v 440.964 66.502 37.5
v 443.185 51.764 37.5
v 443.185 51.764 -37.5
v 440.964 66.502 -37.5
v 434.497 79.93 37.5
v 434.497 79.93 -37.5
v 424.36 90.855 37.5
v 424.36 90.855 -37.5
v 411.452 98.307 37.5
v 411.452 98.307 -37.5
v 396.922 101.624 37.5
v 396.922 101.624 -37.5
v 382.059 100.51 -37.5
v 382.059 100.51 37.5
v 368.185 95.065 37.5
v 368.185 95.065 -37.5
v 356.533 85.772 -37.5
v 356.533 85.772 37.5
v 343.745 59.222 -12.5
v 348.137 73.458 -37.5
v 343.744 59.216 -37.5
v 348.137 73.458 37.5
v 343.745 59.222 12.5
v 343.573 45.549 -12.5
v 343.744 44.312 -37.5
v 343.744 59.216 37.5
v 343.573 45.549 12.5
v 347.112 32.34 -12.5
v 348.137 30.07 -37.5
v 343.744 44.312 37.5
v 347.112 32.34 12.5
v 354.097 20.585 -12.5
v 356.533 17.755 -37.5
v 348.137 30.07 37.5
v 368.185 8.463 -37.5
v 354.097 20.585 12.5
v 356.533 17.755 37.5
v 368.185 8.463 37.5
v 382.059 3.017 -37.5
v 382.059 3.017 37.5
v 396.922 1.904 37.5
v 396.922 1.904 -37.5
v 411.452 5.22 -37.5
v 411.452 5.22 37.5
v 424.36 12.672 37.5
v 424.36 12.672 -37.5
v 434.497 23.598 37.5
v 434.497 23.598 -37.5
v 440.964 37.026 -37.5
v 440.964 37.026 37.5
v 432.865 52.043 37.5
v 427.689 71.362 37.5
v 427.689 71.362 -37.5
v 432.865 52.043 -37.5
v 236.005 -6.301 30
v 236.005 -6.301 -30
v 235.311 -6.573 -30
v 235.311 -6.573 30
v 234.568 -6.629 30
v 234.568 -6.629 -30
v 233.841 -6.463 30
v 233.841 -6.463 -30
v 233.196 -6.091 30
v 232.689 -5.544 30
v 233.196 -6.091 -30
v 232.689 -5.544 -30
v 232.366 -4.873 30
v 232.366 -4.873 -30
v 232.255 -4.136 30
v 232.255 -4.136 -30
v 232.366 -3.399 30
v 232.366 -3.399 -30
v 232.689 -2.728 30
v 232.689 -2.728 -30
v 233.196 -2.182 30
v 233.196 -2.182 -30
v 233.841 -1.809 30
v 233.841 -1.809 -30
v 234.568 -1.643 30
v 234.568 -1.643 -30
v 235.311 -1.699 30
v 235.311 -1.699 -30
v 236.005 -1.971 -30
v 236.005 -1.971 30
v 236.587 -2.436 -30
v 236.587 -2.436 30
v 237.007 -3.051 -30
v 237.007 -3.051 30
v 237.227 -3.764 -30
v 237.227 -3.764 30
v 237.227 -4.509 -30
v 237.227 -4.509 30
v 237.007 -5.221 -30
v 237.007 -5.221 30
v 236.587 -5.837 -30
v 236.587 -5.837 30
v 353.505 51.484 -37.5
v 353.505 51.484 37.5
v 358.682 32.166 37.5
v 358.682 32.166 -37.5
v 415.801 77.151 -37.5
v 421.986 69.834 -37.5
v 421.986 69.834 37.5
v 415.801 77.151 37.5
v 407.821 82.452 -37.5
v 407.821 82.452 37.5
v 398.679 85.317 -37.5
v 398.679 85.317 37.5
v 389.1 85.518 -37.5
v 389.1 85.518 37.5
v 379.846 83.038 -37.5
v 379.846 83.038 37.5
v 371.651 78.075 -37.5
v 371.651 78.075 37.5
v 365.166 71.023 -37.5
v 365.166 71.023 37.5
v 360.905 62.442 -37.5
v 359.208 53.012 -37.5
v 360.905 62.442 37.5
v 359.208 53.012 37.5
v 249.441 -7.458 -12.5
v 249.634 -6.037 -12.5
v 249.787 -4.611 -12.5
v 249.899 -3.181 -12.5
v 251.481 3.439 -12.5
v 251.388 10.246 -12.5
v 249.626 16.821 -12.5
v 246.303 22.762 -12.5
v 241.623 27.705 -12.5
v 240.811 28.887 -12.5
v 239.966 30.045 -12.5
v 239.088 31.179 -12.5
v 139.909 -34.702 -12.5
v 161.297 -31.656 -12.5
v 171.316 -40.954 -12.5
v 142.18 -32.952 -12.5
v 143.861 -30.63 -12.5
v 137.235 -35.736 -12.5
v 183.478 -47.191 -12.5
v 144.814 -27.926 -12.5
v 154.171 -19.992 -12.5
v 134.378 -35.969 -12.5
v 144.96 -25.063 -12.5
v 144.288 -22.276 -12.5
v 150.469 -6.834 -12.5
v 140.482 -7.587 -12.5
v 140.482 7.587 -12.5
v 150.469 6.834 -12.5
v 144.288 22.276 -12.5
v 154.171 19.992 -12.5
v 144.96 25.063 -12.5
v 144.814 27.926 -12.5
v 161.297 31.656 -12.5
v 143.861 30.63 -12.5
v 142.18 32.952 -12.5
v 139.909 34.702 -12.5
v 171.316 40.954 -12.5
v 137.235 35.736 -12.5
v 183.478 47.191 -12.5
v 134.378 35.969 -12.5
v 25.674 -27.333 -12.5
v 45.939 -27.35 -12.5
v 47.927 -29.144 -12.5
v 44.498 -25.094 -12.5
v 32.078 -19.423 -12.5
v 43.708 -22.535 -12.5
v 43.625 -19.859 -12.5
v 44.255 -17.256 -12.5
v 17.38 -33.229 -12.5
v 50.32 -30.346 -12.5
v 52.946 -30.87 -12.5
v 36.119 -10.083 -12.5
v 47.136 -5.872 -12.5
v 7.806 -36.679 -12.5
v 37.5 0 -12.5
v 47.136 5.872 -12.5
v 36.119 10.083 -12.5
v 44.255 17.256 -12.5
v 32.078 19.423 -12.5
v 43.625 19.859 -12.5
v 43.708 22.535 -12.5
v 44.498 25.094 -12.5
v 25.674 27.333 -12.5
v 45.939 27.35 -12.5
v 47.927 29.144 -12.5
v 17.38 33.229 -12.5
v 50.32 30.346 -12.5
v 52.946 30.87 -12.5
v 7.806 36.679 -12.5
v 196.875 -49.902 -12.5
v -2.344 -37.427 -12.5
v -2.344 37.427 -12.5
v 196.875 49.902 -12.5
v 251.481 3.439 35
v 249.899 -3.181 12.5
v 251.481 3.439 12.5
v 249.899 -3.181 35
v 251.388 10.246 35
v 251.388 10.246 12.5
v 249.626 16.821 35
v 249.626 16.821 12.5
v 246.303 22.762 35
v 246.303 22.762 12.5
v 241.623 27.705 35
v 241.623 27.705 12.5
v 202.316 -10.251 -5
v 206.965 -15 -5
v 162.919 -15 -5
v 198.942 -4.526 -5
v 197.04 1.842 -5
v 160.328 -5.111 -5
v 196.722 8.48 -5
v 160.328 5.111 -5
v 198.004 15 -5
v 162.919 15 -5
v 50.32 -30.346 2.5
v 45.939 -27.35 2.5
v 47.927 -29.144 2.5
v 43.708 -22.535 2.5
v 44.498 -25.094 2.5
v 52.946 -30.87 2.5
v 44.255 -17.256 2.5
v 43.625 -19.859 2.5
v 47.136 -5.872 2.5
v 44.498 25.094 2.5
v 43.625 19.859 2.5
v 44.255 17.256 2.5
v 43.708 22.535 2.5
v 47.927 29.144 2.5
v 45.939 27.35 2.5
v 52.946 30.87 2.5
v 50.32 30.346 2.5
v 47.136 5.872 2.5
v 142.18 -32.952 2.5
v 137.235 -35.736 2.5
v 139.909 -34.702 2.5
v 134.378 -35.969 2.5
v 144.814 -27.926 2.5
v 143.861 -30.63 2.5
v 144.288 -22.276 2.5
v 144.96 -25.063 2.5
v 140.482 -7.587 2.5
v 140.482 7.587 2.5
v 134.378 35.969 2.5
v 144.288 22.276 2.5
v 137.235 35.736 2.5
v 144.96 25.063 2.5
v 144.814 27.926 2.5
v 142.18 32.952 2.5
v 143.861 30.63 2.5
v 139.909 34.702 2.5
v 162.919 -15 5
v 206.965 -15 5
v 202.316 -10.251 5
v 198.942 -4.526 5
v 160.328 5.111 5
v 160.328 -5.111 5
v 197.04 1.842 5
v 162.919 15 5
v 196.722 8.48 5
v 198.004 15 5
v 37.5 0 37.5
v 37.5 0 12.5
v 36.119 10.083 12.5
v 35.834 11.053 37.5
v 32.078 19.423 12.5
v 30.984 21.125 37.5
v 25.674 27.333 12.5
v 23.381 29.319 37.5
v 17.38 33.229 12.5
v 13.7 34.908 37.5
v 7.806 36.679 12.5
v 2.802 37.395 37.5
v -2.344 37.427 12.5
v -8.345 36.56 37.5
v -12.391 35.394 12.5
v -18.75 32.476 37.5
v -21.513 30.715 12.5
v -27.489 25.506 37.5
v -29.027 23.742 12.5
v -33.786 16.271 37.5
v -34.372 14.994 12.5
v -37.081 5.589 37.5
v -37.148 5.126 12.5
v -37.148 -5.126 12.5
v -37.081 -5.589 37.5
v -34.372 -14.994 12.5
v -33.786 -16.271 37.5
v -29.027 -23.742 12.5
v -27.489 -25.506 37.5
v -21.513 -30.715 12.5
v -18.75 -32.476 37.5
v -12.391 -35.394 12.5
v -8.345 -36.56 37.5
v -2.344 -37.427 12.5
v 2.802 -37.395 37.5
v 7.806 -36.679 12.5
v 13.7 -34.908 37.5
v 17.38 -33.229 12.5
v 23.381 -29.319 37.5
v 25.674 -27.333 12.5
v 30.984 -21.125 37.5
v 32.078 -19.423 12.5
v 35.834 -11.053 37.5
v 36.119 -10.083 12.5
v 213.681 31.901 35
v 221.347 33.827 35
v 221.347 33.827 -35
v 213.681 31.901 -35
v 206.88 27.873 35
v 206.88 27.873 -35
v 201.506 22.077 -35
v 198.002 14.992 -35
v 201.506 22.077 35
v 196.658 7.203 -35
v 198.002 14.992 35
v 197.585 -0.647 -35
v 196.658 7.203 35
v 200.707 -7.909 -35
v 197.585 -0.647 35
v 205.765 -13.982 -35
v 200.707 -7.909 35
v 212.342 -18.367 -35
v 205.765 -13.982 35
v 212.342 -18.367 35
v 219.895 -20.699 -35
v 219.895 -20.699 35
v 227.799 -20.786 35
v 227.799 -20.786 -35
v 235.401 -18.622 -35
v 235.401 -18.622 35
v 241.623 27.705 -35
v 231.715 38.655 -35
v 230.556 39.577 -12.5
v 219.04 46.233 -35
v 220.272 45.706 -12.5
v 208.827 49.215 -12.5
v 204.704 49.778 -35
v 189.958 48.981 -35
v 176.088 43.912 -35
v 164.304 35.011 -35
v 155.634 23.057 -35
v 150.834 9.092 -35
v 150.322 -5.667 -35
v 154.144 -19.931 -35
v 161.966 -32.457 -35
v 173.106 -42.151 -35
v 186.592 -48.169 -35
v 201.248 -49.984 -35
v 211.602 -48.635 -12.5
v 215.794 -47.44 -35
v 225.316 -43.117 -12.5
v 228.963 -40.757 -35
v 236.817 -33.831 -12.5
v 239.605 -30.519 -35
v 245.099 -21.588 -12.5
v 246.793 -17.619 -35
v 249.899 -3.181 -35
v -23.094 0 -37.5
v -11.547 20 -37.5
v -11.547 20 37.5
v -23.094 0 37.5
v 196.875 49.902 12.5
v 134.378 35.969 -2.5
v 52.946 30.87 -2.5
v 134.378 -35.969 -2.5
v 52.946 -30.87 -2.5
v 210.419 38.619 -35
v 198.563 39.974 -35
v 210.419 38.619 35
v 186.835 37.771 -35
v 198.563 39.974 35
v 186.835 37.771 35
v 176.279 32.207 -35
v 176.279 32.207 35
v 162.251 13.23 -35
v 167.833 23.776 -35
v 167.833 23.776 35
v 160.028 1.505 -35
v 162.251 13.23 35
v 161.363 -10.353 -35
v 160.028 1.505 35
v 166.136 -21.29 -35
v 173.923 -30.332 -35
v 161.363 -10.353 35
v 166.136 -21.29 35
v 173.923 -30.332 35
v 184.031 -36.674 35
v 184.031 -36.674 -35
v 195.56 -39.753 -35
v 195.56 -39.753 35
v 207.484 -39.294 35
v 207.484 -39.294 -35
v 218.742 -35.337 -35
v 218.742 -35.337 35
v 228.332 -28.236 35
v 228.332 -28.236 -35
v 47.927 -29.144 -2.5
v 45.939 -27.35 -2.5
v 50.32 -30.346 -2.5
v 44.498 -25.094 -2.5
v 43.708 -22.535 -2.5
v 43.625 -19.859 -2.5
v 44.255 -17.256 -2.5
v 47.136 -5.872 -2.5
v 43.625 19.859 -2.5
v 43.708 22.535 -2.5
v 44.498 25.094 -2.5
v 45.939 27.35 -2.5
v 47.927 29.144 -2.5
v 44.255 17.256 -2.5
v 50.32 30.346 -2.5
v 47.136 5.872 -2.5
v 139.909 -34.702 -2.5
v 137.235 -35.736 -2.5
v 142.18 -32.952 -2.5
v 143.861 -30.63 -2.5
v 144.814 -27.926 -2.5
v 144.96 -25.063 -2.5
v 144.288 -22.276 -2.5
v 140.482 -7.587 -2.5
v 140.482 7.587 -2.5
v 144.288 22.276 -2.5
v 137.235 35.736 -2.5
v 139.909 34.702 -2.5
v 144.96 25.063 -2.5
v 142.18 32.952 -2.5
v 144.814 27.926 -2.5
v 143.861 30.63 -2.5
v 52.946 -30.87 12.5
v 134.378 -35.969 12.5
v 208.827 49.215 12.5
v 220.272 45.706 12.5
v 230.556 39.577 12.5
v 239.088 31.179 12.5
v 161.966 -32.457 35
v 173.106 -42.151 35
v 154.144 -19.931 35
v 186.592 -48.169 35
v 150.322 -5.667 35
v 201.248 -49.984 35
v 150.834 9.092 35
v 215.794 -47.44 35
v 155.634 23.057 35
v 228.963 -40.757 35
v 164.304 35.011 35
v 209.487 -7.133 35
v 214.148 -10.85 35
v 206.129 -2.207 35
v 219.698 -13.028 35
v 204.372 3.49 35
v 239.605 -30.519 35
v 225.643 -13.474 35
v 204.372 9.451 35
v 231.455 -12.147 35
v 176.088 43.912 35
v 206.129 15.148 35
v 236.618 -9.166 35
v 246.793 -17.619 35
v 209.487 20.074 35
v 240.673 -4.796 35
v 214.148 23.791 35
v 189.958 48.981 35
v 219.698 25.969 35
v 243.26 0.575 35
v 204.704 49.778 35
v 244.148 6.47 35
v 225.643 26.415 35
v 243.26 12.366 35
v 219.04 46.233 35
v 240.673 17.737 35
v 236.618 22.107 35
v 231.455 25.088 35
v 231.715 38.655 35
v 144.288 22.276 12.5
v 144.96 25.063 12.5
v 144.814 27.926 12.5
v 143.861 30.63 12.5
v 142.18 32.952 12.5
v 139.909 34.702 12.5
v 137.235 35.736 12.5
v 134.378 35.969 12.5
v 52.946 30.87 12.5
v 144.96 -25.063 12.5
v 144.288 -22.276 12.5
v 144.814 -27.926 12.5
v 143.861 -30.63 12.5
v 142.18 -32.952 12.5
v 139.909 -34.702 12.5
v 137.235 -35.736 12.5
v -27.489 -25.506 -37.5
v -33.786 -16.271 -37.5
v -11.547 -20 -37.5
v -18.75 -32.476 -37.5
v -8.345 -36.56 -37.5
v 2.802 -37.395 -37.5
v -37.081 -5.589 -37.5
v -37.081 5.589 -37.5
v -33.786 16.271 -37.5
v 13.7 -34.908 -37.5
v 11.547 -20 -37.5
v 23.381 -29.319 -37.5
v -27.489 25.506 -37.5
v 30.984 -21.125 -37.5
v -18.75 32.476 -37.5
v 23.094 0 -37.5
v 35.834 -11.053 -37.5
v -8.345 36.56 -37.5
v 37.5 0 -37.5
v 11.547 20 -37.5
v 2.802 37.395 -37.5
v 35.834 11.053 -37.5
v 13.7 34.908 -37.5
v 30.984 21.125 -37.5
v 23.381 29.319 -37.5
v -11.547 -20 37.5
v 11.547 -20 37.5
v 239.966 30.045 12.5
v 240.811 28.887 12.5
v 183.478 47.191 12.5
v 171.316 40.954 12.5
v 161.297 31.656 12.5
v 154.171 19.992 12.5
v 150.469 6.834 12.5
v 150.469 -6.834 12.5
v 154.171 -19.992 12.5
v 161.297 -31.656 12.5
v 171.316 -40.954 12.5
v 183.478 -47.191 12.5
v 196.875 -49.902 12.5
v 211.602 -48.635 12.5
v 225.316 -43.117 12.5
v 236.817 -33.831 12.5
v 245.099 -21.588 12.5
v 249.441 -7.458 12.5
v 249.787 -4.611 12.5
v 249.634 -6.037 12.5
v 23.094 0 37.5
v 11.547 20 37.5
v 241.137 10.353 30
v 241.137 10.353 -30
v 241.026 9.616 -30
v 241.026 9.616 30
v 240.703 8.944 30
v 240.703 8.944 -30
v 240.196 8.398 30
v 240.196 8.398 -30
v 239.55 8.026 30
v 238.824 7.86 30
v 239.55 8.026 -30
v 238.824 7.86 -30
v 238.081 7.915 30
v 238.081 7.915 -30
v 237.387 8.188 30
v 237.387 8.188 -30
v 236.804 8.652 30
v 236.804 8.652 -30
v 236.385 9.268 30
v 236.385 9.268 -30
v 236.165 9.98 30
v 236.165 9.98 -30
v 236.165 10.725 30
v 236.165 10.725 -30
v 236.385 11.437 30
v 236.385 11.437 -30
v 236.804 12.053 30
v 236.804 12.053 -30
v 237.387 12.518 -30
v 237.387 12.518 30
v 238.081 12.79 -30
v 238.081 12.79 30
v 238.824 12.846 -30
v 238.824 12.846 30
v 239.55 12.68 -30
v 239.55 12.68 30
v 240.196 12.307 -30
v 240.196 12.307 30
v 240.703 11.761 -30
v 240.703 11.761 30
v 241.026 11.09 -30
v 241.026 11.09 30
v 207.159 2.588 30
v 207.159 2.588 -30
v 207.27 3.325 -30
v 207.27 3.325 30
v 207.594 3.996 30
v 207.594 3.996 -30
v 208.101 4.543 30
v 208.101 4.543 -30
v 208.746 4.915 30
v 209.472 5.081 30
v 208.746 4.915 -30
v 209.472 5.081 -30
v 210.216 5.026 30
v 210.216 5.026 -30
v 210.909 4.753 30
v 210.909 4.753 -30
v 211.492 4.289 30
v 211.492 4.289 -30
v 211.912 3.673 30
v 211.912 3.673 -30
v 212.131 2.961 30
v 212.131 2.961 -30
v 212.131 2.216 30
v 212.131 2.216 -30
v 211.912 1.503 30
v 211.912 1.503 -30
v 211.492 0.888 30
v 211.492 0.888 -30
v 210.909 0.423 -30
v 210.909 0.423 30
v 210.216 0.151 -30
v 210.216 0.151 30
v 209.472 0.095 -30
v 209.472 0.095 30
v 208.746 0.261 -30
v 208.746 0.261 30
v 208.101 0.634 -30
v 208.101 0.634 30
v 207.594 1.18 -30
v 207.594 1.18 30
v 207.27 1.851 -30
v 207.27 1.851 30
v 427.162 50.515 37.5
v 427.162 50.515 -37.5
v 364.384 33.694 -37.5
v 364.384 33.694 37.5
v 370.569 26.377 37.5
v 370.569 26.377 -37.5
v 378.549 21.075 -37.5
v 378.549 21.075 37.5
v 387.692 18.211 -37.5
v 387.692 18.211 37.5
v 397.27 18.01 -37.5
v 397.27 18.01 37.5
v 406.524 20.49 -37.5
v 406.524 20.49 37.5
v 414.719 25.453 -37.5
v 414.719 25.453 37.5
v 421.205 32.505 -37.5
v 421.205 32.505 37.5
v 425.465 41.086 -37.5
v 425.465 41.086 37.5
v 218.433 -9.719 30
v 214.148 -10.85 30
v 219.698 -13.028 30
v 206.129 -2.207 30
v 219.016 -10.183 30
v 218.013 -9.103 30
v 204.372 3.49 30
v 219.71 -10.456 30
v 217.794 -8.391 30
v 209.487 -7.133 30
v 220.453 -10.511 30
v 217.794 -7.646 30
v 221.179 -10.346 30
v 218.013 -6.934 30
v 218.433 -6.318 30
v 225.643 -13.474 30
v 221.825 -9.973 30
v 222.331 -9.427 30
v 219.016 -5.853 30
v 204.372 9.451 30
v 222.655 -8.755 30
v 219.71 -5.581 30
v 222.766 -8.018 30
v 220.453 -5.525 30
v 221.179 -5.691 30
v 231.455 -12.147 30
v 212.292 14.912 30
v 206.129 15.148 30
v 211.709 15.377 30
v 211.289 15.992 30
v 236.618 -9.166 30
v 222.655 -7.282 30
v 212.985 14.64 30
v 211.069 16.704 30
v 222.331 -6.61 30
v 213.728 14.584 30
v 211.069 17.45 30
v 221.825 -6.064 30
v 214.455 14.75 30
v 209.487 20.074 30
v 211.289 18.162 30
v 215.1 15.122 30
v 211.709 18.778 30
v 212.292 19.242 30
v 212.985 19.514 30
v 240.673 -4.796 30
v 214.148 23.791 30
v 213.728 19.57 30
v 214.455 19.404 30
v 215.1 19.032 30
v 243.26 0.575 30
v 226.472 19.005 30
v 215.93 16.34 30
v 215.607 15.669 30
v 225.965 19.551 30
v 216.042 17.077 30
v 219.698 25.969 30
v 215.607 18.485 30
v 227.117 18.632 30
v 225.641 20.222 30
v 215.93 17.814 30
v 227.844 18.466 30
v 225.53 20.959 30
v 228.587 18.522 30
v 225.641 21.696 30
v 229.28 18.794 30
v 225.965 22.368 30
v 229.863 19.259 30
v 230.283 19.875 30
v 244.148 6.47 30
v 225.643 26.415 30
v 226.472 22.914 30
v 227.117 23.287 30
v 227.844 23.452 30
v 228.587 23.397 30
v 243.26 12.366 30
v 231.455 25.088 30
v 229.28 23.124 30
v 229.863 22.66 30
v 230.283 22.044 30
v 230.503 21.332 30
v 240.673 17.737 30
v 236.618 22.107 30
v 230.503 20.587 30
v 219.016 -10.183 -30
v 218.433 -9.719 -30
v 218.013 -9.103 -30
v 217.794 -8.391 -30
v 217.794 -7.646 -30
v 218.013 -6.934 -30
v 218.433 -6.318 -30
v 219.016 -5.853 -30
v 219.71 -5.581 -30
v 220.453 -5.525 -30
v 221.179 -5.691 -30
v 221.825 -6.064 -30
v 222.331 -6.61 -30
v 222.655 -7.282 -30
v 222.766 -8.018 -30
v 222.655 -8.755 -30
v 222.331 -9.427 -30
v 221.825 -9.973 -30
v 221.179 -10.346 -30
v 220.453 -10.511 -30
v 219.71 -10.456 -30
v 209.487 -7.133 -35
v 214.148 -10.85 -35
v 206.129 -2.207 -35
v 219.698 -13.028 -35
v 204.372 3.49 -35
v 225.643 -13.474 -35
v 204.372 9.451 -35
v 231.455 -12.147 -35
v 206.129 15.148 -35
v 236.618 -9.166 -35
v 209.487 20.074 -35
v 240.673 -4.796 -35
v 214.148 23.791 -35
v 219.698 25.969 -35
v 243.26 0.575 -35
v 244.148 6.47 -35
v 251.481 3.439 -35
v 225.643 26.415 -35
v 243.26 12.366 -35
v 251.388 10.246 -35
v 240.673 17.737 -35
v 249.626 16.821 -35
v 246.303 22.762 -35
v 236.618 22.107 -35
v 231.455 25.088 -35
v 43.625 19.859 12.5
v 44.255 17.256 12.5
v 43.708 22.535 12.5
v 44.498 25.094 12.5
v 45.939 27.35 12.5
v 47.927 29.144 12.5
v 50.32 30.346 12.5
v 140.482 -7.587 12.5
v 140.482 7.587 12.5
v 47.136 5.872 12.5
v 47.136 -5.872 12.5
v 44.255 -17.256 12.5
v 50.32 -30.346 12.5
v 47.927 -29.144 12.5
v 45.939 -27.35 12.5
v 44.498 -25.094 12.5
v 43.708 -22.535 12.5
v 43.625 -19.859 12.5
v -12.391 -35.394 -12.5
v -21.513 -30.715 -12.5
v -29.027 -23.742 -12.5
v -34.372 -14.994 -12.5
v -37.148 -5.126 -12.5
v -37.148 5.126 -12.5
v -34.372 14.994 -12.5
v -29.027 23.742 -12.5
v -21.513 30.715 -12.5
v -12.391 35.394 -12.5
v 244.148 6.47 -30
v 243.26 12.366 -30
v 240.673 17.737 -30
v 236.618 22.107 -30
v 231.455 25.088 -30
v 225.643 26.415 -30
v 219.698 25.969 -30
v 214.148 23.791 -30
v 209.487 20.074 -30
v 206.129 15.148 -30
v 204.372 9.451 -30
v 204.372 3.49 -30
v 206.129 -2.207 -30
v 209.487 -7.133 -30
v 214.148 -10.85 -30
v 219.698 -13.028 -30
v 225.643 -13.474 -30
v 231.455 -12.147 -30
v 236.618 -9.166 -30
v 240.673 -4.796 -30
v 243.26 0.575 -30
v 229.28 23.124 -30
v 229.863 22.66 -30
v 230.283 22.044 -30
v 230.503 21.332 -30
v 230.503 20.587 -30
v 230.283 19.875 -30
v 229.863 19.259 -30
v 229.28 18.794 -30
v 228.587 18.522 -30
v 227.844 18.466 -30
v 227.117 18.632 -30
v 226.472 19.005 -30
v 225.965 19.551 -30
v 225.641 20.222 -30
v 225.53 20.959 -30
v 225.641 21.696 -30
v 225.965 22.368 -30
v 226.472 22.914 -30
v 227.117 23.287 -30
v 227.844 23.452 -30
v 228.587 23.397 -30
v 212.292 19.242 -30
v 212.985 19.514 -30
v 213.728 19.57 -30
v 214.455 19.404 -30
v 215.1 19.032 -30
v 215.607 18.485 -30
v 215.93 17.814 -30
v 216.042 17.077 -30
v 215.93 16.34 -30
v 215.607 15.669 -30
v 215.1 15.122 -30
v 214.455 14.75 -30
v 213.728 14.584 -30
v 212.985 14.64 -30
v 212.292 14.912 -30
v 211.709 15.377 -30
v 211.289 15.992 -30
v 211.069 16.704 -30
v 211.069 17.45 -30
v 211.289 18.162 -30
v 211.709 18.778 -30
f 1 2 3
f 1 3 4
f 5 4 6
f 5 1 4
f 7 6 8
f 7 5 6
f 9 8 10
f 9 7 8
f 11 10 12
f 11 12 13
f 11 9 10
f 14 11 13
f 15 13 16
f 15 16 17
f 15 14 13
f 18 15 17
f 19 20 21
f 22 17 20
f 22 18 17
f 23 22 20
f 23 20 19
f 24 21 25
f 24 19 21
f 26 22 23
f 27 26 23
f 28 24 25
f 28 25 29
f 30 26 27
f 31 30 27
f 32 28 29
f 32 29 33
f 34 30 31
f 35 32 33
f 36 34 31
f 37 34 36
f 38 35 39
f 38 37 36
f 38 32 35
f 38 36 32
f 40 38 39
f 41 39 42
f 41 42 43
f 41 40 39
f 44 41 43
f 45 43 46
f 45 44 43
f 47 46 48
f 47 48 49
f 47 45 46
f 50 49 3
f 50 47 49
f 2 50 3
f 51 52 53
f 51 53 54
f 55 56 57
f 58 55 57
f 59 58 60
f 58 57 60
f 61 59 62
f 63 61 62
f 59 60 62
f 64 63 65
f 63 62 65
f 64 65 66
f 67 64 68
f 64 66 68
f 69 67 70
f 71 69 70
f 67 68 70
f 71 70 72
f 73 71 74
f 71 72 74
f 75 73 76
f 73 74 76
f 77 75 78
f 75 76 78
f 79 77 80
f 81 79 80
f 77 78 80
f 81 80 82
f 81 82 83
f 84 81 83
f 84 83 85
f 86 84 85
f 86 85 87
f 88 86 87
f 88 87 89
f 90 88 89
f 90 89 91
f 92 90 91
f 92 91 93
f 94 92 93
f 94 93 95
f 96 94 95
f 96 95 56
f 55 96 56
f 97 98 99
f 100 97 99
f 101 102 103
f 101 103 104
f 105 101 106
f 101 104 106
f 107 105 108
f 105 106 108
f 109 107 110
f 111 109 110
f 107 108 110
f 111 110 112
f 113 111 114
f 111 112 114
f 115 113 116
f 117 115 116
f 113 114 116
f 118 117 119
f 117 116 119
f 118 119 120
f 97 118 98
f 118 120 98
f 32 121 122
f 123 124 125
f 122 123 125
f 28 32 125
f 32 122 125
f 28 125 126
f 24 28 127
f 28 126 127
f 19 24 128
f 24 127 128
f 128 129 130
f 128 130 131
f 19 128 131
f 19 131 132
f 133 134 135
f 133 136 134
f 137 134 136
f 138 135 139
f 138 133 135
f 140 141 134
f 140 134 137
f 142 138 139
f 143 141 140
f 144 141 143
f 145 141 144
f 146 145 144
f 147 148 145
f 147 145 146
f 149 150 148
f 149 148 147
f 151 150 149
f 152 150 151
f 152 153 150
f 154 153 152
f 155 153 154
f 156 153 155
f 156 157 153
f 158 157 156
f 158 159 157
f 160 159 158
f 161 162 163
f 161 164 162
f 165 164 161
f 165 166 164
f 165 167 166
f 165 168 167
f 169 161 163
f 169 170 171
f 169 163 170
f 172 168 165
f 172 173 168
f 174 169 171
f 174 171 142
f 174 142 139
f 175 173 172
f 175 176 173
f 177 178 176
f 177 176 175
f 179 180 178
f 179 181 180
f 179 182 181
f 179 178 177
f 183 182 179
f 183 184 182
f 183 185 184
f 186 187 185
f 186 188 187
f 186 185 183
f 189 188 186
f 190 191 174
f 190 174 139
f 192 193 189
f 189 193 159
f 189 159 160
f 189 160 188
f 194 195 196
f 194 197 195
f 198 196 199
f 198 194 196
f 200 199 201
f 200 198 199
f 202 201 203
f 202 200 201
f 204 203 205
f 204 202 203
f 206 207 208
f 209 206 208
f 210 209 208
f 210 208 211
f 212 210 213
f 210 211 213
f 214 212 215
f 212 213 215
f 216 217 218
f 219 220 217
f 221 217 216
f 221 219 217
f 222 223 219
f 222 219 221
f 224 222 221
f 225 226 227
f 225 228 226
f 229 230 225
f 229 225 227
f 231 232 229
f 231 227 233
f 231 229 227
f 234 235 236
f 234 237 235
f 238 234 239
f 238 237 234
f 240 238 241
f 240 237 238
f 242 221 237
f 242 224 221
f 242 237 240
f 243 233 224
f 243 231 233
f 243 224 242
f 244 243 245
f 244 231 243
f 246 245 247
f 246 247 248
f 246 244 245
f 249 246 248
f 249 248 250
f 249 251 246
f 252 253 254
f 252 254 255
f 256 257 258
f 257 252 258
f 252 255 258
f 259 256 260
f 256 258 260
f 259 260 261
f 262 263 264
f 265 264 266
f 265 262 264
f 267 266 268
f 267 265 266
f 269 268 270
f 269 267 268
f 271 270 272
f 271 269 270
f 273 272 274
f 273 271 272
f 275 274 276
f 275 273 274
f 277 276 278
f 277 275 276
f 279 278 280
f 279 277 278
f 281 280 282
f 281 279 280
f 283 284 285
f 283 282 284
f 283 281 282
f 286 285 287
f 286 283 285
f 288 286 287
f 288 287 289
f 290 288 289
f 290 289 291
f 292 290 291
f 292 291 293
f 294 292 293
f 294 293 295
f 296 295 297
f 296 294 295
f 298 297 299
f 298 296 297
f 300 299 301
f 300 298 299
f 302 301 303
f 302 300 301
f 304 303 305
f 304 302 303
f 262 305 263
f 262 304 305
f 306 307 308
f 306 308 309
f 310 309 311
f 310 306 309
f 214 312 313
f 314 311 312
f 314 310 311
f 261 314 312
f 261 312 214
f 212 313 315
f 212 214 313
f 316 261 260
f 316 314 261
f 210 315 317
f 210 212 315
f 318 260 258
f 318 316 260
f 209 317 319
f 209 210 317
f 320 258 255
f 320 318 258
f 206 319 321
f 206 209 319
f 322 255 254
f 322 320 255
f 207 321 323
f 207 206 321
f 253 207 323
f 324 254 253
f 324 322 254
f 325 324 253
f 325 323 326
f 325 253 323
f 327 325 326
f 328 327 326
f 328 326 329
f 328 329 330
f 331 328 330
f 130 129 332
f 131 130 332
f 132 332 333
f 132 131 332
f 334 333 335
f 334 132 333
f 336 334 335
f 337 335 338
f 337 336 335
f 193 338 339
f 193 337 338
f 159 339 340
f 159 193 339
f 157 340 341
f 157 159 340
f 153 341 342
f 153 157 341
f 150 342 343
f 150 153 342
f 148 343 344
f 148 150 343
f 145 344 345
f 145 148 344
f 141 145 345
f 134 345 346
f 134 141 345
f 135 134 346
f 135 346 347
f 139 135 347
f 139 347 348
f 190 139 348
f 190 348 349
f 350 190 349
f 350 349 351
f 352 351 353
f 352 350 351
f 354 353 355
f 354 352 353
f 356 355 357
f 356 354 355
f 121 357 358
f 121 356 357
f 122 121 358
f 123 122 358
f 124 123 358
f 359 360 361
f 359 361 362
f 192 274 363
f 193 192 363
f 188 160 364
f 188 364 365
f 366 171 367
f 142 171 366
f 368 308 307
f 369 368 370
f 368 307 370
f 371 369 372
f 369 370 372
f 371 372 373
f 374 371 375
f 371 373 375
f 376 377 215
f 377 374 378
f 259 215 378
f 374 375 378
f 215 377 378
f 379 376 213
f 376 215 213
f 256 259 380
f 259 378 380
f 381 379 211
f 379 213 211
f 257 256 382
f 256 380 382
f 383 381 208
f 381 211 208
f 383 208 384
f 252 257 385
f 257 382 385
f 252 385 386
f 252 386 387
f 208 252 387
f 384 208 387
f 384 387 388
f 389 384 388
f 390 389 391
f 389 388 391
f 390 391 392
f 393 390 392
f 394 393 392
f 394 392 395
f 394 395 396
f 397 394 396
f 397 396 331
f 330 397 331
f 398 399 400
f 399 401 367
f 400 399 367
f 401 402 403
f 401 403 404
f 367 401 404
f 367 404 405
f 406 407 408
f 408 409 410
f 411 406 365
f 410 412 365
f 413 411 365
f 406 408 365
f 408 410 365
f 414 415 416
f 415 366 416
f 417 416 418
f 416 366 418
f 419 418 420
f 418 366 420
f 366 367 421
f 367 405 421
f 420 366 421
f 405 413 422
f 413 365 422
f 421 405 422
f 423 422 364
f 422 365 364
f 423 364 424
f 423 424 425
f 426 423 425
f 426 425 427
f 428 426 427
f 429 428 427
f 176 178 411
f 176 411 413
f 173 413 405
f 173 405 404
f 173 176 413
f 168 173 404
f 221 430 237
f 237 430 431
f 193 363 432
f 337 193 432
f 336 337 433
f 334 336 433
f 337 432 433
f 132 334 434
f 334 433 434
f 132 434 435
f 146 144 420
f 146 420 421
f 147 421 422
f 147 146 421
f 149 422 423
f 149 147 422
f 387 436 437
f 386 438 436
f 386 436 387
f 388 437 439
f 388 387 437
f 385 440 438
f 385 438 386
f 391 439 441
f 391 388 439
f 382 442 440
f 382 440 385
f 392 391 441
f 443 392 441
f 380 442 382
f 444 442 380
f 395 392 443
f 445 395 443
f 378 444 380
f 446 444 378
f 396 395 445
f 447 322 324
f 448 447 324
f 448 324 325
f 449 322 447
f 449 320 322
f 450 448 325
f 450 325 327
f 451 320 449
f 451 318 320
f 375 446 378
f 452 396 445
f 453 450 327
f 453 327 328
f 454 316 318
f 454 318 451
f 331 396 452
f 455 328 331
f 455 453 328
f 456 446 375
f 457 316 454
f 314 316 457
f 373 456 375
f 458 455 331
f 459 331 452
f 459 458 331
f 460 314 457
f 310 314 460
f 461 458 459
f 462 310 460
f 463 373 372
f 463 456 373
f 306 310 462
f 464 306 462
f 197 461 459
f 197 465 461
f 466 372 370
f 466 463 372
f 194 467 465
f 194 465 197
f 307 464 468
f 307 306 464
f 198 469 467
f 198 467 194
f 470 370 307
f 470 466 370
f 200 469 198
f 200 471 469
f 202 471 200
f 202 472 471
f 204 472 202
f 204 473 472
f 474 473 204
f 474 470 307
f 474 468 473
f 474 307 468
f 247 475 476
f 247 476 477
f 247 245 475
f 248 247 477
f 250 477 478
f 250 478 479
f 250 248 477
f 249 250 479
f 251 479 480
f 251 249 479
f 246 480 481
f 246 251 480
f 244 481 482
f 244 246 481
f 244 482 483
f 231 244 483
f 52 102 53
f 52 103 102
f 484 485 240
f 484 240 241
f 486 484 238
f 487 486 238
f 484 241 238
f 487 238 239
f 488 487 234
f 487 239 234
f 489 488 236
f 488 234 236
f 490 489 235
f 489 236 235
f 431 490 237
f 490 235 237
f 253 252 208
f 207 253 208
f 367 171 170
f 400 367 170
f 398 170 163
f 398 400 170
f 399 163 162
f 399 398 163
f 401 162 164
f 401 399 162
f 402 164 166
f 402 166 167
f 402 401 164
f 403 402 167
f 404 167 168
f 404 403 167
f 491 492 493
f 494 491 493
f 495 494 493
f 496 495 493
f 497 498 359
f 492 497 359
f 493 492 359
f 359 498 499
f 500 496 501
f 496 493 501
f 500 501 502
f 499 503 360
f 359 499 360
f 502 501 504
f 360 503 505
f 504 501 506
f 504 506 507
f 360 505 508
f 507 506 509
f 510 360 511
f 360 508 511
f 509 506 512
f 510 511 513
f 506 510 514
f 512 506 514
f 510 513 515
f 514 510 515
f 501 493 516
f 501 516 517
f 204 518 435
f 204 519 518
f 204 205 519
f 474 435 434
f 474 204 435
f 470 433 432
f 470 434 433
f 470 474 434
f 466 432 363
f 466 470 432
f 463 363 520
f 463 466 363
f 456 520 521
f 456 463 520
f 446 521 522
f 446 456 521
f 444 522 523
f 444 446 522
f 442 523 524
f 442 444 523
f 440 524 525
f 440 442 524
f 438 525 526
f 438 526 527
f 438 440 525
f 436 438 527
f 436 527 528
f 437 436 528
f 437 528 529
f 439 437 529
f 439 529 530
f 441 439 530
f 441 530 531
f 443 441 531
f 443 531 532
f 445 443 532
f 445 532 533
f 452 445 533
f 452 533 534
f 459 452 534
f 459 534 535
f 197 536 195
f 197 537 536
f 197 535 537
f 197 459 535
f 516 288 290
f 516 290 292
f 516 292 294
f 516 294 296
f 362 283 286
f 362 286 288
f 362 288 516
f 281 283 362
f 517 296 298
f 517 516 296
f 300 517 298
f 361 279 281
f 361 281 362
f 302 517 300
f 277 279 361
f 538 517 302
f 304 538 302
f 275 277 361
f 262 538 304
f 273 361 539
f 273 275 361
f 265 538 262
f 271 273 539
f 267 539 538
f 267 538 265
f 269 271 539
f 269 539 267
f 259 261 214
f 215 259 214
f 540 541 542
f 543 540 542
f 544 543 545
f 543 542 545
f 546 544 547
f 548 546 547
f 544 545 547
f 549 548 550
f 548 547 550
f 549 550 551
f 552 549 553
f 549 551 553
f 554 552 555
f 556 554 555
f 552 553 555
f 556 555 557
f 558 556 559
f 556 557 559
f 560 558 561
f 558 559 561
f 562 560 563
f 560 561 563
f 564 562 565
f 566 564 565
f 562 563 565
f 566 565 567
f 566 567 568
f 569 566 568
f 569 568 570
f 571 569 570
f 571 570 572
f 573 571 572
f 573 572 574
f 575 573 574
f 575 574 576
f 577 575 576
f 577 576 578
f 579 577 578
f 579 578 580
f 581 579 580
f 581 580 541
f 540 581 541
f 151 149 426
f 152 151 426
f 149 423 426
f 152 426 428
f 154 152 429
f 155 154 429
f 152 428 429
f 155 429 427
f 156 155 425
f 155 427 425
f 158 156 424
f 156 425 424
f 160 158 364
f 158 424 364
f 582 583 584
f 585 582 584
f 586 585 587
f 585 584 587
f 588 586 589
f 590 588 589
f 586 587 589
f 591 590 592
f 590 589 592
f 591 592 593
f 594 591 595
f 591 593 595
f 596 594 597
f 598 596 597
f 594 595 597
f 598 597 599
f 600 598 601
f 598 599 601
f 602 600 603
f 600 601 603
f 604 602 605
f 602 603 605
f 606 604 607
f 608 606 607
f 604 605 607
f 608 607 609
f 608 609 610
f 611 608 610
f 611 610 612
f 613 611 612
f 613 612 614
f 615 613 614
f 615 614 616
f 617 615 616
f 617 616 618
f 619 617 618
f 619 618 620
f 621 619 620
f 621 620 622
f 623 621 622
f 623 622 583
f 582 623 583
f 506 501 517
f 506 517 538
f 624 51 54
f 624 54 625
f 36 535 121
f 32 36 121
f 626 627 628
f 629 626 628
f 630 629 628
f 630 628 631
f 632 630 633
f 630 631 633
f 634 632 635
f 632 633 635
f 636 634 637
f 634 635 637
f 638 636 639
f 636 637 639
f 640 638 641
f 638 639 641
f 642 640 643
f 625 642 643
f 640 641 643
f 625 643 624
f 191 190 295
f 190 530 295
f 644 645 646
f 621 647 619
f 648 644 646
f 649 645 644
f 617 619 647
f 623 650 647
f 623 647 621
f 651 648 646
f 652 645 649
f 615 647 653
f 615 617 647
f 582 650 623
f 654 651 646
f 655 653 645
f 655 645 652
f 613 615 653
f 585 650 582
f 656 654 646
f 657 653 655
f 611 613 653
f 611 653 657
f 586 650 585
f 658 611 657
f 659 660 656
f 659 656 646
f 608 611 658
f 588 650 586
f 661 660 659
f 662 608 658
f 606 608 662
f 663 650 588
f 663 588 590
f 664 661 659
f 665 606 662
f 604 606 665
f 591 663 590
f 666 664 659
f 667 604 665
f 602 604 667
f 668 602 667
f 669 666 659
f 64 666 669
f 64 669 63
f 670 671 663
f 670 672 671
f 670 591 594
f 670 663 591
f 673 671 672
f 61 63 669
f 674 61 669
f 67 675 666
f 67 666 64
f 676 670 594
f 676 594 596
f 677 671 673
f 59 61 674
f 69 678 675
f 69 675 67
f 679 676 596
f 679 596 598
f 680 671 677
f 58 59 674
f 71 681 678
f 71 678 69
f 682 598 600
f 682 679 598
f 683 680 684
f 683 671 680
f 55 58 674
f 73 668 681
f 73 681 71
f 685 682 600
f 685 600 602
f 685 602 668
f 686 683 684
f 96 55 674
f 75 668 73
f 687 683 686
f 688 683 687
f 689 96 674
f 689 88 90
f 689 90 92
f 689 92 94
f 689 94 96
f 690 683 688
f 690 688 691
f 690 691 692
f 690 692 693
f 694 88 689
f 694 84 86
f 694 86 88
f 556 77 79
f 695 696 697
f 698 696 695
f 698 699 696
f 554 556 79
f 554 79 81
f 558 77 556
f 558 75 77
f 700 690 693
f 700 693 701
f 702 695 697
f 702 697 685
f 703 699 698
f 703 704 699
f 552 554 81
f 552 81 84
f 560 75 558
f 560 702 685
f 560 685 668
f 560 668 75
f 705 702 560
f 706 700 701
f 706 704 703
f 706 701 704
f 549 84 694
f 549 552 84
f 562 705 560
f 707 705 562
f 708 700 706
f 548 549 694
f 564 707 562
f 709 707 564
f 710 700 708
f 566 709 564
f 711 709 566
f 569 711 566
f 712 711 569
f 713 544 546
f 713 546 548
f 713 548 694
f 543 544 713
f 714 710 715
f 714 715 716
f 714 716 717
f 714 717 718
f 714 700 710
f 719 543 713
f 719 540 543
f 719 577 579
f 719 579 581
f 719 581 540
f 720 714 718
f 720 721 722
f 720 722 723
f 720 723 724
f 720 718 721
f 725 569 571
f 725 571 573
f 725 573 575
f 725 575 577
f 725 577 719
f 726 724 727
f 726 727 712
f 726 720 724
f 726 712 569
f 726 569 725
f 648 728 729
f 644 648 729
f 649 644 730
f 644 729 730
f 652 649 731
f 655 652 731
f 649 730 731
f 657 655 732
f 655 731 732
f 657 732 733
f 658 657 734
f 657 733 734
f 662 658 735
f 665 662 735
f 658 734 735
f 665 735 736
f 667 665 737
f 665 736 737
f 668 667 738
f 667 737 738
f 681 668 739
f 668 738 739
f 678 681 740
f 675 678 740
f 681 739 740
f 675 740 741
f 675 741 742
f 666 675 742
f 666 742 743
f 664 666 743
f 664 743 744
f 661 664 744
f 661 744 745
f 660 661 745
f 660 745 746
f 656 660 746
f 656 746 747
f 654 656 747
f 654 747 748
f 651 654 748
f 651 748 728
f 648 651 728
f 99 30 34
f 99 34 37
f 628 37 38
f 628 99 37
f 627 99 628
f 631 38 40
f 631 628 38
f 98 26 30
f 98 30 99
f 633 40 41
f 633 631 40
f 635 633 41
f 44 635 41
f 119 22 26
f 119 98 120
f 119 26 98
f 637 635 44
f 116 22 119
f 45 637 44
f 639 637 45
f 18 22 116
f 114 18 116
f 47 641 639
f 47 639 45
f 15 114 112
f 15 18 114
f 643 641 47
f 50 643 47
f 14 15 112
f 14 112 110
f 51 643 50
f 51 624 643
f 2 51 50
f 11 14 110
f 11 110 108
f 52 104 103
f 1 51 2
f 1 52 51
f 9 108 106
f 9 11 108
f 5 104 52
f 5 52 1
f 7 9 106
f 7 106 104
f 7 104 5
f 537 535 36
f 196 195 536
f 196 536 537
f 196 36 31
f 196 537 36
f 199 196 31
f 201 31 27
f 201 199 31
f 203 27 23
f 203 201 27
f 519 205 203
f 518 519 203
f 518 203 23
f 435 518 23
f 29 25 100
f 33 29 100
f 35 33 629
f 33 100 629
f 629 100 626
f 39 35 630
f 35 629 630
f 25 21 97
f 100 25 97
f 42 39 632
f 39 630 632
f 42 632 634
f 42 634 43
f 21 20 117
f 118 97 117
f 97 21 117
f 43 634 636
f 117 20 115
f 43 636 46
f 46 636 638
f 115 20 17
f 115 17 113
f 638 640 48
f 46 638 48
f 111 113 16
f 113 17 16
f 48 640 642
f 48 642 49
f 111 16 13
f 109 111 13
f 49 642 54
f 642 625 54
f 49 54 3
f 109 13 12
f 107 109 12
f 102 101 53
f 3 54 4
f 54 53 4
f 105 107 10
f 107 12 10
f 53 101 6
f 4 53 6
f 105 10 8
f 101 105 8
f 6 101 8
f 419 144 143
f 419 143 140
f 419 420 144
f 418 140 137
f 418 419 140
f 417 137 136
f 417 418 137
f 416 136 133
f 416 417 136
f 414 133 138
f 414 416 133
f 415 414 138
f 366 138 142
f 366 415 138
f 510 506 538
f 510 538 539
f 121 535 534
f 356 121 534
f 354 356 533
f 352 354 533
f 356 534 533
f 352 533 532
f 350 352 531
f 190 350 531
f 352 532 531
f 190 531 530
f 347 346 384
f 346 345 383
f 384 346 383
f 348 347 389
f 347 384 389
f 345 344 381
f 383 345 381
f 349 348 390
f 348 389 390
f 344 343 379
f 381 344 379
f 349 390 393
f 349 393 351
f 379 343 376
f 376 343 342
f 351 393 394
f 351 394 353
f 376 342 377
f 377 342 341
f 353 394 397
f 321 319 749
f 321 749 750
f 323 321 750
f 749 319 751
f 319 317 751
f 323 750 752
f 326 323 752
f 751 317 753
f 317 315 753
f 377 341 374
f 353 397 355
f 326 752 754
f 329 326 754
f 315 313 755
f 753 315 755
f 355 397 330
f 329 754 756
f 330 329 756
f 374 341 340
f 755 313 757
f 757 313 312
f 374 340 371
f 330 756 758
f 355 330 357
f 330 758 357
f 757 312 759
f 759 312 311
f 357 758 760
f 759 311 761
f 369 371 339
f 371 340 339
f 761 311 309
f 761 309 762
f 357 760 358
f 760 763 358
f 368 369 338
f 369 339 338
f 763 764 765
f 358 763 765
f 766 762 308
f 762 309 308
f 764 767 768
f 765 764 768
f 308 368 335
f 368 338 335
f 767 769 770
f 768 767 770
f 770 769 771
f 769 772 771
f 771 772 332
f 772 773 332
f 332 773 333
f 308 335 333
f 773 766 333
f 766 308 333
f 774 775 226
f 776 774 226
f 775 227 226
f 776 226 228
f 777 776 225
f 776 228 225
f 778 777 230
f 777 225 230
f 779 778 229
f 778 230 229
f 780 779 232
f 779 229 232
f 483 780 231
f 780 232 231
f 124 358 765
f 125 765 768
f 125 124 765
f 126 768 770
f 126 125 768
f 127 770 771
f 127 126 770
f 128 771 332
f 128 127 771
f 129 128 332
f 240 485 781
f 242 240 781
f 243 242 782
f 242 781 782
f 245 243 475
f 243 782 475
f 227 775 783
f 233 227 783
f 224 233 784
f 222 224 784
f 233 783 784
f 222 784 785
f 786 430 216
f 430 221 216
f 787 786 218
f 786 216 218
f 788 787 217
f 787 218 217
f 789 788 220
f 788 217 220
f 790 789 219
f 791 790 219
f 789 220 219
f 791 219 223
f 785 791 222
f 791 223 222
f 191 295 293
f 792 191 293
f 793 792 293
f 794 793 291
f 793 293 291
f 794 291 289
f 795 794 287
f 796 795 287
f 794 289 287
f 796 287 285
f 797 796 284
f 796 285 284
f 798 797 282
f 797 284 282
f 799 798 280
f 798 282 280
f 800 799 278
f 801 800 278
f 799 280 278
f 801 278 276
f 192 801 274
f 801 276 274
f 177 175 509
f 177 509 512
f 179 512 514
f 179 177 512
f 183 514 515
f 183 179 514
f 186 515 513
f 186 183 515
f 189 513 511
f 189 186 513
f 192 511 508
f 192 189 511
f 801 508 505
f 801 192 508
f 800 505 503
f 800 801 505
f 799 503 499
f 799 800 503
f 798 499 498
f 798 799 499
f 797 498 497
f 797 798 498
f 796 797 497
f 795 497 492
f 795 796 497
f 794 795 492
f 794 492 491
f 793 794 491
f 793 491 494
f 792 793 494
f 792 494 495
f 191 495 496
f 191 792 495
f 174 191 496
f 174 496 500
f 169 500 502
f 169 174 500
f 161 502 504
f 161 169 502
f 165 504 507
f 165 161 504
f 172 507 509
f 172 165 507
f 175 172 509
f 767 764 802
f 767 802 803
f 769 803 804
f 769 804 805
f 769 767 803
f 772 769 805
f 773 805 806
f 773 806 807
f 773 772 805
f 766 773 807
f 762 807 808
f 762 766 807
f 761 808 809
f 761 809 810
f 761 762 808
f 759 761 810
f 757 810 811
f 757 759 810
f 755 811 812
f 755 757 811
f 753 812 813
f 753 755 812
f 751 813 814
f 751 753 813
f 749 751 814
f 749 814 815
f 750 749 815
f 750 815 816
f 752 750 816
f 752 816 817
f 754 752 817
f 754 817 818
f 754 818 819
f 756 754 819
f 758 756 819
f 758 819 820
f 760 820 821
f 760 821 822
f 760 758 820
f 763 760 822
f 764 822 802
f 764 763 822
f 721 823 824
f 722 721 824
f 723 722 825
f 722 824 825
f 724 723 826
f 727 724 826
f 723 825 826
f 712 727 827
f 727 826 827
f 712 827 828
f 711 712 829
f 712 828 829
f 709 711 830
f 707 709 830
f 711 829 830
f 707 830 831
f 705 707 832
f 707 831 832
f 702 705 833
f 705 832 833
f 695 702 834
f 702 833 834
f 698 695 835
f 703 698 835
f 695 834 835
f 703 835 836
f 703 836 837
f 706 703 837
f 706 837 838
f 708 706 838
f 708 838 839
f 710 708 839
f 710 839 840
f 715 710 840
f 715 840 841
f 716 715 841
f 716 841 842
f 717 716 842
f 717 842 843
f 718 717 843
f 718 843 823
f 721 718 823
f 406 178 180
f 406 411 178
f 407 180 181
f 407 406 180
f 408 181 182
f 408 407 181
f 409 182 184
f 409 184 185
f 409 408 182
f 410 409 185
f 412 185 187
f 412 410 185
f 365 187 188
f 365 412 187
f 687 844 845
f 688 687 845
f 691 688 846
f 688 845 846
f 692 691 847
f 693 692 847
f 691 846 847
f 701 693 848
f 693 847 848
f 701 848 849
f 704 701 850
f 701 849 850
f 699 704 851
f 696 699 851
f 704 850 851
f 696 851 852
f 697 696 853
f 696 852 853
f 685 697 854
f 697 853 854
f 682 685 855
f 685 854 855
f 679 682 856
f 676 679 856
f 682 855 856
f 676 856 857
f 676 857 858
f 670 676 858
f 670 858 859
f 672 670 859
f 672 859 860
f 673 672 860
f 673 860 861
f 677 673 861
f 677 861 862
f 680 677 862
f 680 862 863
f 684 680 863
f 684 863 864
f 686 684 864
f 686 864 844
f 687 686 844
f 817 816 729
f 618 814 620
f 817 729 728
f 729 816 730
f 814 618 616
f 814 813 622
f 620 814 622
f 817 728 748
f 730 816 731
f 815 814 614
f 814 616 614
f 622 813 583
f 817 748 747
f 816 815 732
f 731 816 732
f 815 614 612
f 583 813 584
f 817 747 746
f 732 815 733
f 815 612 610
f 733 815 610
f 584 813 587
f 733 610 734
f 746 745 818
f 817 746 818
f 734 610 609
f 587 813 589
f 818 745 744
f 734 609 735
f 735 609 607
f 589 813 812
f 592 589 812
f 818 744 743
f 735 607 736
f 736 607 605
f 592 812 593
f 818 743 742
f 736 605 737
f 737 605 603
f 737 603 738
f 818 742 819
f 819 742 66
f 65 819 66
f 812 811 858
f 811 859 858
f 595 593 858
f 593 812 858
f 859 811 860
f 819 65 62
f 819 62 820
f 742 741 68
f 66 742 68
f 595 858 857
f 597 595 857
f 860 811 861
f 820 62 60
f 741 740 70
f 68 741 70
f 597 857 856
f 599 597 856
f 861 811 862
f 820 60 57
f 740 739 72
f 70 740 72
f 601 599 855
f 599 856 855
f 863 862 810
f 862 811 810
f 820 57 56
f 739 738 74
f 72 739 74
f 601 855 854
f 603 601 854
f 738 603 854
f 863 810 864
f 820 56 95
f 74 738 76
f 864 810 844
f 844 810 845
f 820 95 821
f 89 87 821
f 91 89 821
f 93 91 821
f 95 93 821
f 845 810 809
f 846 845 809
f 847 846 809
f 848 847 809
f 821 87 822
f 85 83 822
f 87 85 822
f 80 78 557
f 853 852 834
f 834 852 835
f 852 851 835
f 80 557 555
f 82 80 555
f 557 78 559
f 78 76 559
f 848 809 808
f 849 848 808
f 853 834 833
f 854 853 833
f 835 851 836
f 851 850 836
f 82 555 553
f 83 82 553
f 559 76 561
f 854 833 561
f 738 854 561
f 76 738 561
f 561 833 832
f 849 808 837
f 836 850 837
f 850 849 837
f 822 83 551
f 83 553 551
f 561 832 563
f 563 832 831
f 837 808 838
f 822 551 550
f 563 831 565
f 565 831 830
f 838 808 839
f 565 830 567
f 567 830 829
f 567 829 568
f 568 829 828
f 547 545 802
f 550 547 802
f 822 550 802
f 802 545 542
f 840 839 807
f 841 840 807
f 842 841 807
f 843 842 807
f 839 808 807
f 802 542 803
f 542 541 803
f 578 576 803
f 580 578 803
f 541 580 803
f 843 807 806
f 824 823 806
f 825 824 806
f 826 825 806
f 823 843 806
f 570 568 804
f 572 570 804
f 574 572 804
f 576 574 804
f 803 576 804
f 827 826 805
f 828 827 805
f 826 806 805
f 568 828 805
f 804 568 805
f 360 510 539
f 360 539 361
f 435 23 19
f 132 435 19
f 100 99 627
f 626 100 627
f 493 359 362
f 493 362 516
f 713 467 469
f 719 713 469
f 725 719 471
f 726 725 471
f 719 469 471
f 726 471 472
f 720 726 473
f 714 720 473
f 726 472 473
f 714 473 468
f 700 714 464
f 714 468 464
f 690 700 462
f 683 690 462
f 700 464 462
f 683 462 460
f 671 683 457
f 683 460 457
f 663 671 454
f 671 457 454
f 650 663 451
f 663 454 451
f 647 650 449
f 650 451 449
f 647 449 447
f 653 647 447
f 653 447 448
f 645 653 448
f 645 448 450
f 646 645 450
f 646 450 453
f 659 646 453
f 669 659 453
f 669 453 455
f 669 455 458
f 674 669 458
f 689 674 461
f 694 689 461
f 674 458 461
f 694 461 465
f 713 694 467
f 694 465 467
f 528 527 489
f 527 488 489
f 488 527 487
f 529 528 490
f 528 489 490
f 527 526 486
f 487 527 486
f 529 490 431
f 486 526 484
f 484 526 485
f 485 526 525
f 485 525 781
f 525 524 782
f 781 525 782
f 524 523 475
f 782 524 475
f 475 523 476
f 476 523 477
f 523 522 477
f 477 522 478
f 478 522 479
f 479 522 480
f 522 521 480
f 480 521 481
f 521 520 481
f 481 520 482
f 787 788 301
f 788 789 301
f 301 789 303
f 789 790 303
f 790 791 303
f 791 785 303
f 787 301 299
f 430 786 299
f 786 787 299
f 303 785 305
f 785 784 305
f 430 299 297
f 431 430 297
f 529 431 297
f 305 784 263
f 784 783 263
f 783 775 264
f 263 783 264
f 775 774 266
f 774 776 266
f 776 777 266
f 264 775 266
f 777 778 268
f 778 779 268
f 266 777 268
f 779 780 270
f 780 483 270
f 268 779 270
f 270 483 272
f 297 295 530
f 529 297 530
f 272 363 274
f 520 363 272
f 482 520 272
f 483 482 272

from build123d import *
from build123d.topology import SkipClean

# Parameters (mm, degrees)
LEFT_ARM_DEPTH                = 12.5
SKETCH2_R                     = 37.5
LEFT_BOSS_DEPTH               = 37.5
LEFT_HEX_DEPTH                = 266.753645
LEFT_HEX_DEPTH_BACK           = 266.753645
SKETCH3_R                     = 50
CENTRE_BOSS_DEPTH             = 35
SKETCH5_W                     = 25
SKETCH5_H                     = 40
RIGHT_ARM_DEPTH               = 200
SKETCH7_R                     = 50
RIGHT_BOSS_DEPTH              = 37.5
SKETCH8_R                     = 34
RIGHT_BOSS_HOLE_DEPTH         = 461.862196
SKETCH9_R                     = 40
CENTRE_HOLE_DEPTH             = 461.461957
SKETCH10_R                    = 27.5
CENTRE_BLOB_DEPTH             = 35
CENTRE_BEAM_REACH             = 268.273
SKETCH11_W                    = 10
SKETCH11_H                    = 30
CENTRE_BEAM_DIRECTION_2_REACH = 268.273
SKETCH12_R                    = 20
CUT_EXTRUDE4_DEPTH            = 5
M6X1_0_TAPPED_HOLE1_D         = 5
CIRPATTERN1_COUNT             = 6
CUT_OUT_DEPTH                 = 10
FILLET1_R                     = 10
FILLET1_OF_MIRROR2_R          = 10
KEYWAY_DEPTH                  = 457.26222


with BuildPart() as part:
    # Sketch1 → LEFT_ARM (new, symmetric)
    with BuildSketch(Plane.XY):
        with BuildLine():
            Line((-2.34375, 37.426686), (196.875, 49.902248))
            ThreePointArc((196.875, 49.902248), (250, 0), (196.875, -49.902248))
            Line((196.875, -49.902248), (-2.34375, -37.426686))
            ThreePointArc((-2.34375, -37.426686), (-37.5, 0), (-2.34375, 37.426686))
        make_face()
    extrude(amount=LEFT_ARM_DEPTH, both=True)

    # Sketch2 → LEFT_Boss (add, symmetric)
    with SkipClean():  # the faces are left unmerged after this step: merging them gives an invalid solid
        with BuildSketch(Plane.XY):
            Circle(SKETCH2_R)
        extrude(amount=LEFT_BOSS_DEPTH, both=True)

    # Sketch4 → LEFT_Hex (cut, two sides: drawn at the far end of the back side and taken through both)
    with SkipClean():  # the faces are left unmerged after this step: merging them gives an invalid solid
        with BuildSketch(Plane.XY.offset(37.5).offset(-LEFT_HEX_DEPTH_BACK)):
            Polygon((23.094011, 0), (11.547005, 20), (-11.547005, 20), (-23.094011, 0), (-11.547005, -20), (11.547005, -20), align=None)
        extrude(amount=LEFT_HEX_DEPTH + LEFT_HEX_DEPTH_BACK, mode=Mode.SUBTRACT)

    # Sketch3 → CENTRE_Boss (add, symmetric)
    with SkipClean():  # the faces are left unmerged after this step: merging them gives an invalid solid
        with BuildSketch(Plane.XY):
            with Locations((200, 0)):
                Circle(SKETCH3_R)
        extrude(amount=CENTRE_BOSS_DEPTH, both=True)

    # Sketch5 → RIGHT_ARM (add)
    with SkipClean():  # the faces are left unmerged after this step: merging them gives an invalid solid
        with BuildSketch(Plane(origin=(186.60254, 50, 0), x_dir=(0, 0, -1), z_dir=(0.9659258262890681, 0.25881904510252135, 0))):
            with Locations((0, -51.763809)):
                Rectangle(SKETCH5_W, SKETCH5_H)
        extrude(amount=RIGHT_ARM_DEPTH)

    # Sketch7 → RIGHT_Boss (add, symmetric)
    with SkipClean():  # the faces are left unmerged after this step: merging them gives an invalid solid
        with BuildSketch(Plane.XY):
            with Locations((393.185165, 51.763809)):
                Circle(SKETCH7_R)
        extrude(amount=RIGHT_BOSS_DEPTH, both=True)

    # Sketch8 → RIGHT_Boss_Hole (cut, through all)
    with SkipClean():  # the faces are left unmerged after this step: merging them gives an invalid solid
        with BuildSketch(Plane.XY.offset(37.5)):
            with Locations((393.185165, 51.763809)):
                Circle(SKETCH8_R)
        extrude(amount=-RIGHT_BOSS_HOLE_DEPTH, mode=Mode.SUBTRACT)

    # Sketch9 → CENTRE_Hole (cut, through all)
    with SkipClean():  # the faces are left unmerged after this step: merging them gives an invalid solid
        with BuildSketch(Plane.XY.offset(35)):
            with Locations((200, 0)):
                Circle(SKETCH9_R)
        extrude(amount=-CENTRE_HOLE_DEPTH, mode=Mode.SUBTRACT)

    # Sketch10 → CENTRE_Blob (add, symmetric)
    with SkipClean():  # the faces are left unmerged after this step: merging them gives an invalid solid
        with BuildSketch(Plane.XY):
            with Locations((224.148146, 6.470476)):
                Circle(SKETCH10_R)
        extrude(amount=CENTRE_BLOB_DEPTH, both=True)

    # Sketch11 → CENTRE_Beam (add, up to next)
    with BuildSketch(Plane(origin=(200, 0, 0), x_dir=(0, 0, -1), z_dir=(1, 0, 0)), mode=Mode.PRIVATE) as centre_beam_sk1:
        Rectangle(SKETCH11_W, SKETCH11_H)
    centre_beam_tool1 = extrude(centre_beam_sk1.sketch, amount=CENTRE_BEAM_REACH, mode=Mode.PRIVATE) - part.part
    add(centre_beam_tool1.solids().sort_by_distance((200, 0, 0))[0])

    # Sketch11 → CENTRE_Beam direction 2 (add, up to next)
    with BuildSketch(Plane(origin=(200, 0, 0), x_dir=(0, 0, -1), z_dir=(1, 0, 0)), mode=Mode.PRIVATE) as centre_beam_direction_2_sk1:
        Rectangle(SKETCH11_W, SKETCH11_H)
    centre_beam_direction_2_tool1 = extrude(centre_beam_direction_2_sk1.sketch, amount=-CENTRE_BEAM_DIRECTION_2_REACH, mode=Mode.PRIVATE) - part.part
    add(centre_beam_direction_2_tool1.solids().sort_by_distance((200, 0, 0))[0])

    # Sketch12 → Cut-Extrude4 (cut)
    with SkipClean():  # the faces are left unmerged after this step: merging them gives an invalid solid
        with BuildSketch(Plane.XY.offset(35)):
            with Locations((224.148146, 6.470476)):
                Circle(SKETCH12_R)
        cut_extrude4 = extrude(amount=-CUT_EXTRUDE4_DEPTH, mode=Mode.SUBTRACT)

    # M6x1.0 Tapped Hole1 (through all)
    with Locations(Plane.XY.offset(30)):
        with Locations((209.659258, 2.58819)):
            m6x1_0_tapped_hole1 = Hole(M6X1_0_TAPPED_HOLE1_D / 2)

    # CirPattern1: M6x1.0 Tapped Hole1 ×6 about axis
    with SkipClean():  # the faces are left unmerged after this step: merging them gives an invalid solid
        cirpattern1_axis = Axis((224.148146, 6.470476, 0), (0, 0, 1))
        for i in range(1, CIRPATTERN1_COUNT):
            add(m6x1_0_tapped_hole1.rotate(cirpattern1_axis, i * 360 / CIRPATTERN1_COUNT), mode=Mode.SUBTRACT)

    # Mirror1: Cut-Extrude4 across plane
    with SkipClean():  # the faces are left unmerged after this step: merging them gives an invalid solid
        add(cut_extrude4.mirror(Plane.XY), mode=Mode.SUBTRACT)

    # Sketch15 → Cut_OUT (cut)
    with SkipClean():  # the faces are left unmerged after this step: merging them gives an invalid solid
        with BuildSketch(Plane.XY.offset(12.5)):
            with BuildLine():
                Line((152.866072, 37.126714), (36.935365, 29.866851))
                ThreePointArc((36.935365, 29.866851), (47.5, 0), (36.935365, -29.866851))
                Line((36.935365, -29.866851), (152.866072, -37.126714))
                ThreePointArc((152.866072, -37.126714), (140, 0), (152.866072, 37.126714))
            make_face()
        cut_out = extrude(amount=-CUT_OUT_DEPTH, mode=Mode.SUBTRACT)

    # Fillet1
    fillet1_edges = [part.edges().sort_by_distance(p)[0] for p in [
        (36.935365, -29.866851, 7.5),
        (36.935365, 29.866851, 7.5),
        (152.866072, 37.126714, 7.5),
        (152.866072, -37.126714, 7.5),
    ]]
    fillet(fillet1_edges, radius=FILLET1_R)

    # Mirror2: Cut_OUT across plane
    with SkipClean():  # the faces are left unmerged after this step: merging them gives an invalid solid
        add(cut_out.mirror(Plane.XY), mode=Mode.SUBTRACT)

    # Fillet1 of Mirror2
    fillet1_of_mirror2_edges = [part.edges().sort_by_distance(p)[0] for p in [
        (36.935365, -29.866851, -7.5),
        (36.935365, 29.866851, -7.5),
        (152.866072, 37.126714, -7.5),
        (152.866072, -37.126714, -7.5),
    ]]
    fillet(fillet1_of_mirror2_edges, radius=FILLET1_OF_MIRROR2_R)

    # Sketch16 → KEYWAY (cut, symmetric)
    with SkipClean():  # the faces are left unmerged after this step: merging them gives an invalid solid
        with BuildSketch(Plane.XY):
            Polygon((395.773356, 42.104551), (390.596975, 61.423067), (353.505423, 51.484416), (358.681804, 32.165899), align=None)
        keyway = extrude(amount=KEYWAY_DEPTH, both=True, mode=Mode.SUBTRACT)

    # Mirror3: KEYWAY across plane
    with SkipClean():  # the faces are left unmerged after this step: merging them gives an invalid solid
        add(keyway.mirror(Plane(origin=(379.787706, 101.763809, 0), x_dir=(0, 0, 1), z_dir=(0.9659258262890681, 0.25881904510252135, 0))), mode=Mode.SUBTRACT)


solid = part.part
